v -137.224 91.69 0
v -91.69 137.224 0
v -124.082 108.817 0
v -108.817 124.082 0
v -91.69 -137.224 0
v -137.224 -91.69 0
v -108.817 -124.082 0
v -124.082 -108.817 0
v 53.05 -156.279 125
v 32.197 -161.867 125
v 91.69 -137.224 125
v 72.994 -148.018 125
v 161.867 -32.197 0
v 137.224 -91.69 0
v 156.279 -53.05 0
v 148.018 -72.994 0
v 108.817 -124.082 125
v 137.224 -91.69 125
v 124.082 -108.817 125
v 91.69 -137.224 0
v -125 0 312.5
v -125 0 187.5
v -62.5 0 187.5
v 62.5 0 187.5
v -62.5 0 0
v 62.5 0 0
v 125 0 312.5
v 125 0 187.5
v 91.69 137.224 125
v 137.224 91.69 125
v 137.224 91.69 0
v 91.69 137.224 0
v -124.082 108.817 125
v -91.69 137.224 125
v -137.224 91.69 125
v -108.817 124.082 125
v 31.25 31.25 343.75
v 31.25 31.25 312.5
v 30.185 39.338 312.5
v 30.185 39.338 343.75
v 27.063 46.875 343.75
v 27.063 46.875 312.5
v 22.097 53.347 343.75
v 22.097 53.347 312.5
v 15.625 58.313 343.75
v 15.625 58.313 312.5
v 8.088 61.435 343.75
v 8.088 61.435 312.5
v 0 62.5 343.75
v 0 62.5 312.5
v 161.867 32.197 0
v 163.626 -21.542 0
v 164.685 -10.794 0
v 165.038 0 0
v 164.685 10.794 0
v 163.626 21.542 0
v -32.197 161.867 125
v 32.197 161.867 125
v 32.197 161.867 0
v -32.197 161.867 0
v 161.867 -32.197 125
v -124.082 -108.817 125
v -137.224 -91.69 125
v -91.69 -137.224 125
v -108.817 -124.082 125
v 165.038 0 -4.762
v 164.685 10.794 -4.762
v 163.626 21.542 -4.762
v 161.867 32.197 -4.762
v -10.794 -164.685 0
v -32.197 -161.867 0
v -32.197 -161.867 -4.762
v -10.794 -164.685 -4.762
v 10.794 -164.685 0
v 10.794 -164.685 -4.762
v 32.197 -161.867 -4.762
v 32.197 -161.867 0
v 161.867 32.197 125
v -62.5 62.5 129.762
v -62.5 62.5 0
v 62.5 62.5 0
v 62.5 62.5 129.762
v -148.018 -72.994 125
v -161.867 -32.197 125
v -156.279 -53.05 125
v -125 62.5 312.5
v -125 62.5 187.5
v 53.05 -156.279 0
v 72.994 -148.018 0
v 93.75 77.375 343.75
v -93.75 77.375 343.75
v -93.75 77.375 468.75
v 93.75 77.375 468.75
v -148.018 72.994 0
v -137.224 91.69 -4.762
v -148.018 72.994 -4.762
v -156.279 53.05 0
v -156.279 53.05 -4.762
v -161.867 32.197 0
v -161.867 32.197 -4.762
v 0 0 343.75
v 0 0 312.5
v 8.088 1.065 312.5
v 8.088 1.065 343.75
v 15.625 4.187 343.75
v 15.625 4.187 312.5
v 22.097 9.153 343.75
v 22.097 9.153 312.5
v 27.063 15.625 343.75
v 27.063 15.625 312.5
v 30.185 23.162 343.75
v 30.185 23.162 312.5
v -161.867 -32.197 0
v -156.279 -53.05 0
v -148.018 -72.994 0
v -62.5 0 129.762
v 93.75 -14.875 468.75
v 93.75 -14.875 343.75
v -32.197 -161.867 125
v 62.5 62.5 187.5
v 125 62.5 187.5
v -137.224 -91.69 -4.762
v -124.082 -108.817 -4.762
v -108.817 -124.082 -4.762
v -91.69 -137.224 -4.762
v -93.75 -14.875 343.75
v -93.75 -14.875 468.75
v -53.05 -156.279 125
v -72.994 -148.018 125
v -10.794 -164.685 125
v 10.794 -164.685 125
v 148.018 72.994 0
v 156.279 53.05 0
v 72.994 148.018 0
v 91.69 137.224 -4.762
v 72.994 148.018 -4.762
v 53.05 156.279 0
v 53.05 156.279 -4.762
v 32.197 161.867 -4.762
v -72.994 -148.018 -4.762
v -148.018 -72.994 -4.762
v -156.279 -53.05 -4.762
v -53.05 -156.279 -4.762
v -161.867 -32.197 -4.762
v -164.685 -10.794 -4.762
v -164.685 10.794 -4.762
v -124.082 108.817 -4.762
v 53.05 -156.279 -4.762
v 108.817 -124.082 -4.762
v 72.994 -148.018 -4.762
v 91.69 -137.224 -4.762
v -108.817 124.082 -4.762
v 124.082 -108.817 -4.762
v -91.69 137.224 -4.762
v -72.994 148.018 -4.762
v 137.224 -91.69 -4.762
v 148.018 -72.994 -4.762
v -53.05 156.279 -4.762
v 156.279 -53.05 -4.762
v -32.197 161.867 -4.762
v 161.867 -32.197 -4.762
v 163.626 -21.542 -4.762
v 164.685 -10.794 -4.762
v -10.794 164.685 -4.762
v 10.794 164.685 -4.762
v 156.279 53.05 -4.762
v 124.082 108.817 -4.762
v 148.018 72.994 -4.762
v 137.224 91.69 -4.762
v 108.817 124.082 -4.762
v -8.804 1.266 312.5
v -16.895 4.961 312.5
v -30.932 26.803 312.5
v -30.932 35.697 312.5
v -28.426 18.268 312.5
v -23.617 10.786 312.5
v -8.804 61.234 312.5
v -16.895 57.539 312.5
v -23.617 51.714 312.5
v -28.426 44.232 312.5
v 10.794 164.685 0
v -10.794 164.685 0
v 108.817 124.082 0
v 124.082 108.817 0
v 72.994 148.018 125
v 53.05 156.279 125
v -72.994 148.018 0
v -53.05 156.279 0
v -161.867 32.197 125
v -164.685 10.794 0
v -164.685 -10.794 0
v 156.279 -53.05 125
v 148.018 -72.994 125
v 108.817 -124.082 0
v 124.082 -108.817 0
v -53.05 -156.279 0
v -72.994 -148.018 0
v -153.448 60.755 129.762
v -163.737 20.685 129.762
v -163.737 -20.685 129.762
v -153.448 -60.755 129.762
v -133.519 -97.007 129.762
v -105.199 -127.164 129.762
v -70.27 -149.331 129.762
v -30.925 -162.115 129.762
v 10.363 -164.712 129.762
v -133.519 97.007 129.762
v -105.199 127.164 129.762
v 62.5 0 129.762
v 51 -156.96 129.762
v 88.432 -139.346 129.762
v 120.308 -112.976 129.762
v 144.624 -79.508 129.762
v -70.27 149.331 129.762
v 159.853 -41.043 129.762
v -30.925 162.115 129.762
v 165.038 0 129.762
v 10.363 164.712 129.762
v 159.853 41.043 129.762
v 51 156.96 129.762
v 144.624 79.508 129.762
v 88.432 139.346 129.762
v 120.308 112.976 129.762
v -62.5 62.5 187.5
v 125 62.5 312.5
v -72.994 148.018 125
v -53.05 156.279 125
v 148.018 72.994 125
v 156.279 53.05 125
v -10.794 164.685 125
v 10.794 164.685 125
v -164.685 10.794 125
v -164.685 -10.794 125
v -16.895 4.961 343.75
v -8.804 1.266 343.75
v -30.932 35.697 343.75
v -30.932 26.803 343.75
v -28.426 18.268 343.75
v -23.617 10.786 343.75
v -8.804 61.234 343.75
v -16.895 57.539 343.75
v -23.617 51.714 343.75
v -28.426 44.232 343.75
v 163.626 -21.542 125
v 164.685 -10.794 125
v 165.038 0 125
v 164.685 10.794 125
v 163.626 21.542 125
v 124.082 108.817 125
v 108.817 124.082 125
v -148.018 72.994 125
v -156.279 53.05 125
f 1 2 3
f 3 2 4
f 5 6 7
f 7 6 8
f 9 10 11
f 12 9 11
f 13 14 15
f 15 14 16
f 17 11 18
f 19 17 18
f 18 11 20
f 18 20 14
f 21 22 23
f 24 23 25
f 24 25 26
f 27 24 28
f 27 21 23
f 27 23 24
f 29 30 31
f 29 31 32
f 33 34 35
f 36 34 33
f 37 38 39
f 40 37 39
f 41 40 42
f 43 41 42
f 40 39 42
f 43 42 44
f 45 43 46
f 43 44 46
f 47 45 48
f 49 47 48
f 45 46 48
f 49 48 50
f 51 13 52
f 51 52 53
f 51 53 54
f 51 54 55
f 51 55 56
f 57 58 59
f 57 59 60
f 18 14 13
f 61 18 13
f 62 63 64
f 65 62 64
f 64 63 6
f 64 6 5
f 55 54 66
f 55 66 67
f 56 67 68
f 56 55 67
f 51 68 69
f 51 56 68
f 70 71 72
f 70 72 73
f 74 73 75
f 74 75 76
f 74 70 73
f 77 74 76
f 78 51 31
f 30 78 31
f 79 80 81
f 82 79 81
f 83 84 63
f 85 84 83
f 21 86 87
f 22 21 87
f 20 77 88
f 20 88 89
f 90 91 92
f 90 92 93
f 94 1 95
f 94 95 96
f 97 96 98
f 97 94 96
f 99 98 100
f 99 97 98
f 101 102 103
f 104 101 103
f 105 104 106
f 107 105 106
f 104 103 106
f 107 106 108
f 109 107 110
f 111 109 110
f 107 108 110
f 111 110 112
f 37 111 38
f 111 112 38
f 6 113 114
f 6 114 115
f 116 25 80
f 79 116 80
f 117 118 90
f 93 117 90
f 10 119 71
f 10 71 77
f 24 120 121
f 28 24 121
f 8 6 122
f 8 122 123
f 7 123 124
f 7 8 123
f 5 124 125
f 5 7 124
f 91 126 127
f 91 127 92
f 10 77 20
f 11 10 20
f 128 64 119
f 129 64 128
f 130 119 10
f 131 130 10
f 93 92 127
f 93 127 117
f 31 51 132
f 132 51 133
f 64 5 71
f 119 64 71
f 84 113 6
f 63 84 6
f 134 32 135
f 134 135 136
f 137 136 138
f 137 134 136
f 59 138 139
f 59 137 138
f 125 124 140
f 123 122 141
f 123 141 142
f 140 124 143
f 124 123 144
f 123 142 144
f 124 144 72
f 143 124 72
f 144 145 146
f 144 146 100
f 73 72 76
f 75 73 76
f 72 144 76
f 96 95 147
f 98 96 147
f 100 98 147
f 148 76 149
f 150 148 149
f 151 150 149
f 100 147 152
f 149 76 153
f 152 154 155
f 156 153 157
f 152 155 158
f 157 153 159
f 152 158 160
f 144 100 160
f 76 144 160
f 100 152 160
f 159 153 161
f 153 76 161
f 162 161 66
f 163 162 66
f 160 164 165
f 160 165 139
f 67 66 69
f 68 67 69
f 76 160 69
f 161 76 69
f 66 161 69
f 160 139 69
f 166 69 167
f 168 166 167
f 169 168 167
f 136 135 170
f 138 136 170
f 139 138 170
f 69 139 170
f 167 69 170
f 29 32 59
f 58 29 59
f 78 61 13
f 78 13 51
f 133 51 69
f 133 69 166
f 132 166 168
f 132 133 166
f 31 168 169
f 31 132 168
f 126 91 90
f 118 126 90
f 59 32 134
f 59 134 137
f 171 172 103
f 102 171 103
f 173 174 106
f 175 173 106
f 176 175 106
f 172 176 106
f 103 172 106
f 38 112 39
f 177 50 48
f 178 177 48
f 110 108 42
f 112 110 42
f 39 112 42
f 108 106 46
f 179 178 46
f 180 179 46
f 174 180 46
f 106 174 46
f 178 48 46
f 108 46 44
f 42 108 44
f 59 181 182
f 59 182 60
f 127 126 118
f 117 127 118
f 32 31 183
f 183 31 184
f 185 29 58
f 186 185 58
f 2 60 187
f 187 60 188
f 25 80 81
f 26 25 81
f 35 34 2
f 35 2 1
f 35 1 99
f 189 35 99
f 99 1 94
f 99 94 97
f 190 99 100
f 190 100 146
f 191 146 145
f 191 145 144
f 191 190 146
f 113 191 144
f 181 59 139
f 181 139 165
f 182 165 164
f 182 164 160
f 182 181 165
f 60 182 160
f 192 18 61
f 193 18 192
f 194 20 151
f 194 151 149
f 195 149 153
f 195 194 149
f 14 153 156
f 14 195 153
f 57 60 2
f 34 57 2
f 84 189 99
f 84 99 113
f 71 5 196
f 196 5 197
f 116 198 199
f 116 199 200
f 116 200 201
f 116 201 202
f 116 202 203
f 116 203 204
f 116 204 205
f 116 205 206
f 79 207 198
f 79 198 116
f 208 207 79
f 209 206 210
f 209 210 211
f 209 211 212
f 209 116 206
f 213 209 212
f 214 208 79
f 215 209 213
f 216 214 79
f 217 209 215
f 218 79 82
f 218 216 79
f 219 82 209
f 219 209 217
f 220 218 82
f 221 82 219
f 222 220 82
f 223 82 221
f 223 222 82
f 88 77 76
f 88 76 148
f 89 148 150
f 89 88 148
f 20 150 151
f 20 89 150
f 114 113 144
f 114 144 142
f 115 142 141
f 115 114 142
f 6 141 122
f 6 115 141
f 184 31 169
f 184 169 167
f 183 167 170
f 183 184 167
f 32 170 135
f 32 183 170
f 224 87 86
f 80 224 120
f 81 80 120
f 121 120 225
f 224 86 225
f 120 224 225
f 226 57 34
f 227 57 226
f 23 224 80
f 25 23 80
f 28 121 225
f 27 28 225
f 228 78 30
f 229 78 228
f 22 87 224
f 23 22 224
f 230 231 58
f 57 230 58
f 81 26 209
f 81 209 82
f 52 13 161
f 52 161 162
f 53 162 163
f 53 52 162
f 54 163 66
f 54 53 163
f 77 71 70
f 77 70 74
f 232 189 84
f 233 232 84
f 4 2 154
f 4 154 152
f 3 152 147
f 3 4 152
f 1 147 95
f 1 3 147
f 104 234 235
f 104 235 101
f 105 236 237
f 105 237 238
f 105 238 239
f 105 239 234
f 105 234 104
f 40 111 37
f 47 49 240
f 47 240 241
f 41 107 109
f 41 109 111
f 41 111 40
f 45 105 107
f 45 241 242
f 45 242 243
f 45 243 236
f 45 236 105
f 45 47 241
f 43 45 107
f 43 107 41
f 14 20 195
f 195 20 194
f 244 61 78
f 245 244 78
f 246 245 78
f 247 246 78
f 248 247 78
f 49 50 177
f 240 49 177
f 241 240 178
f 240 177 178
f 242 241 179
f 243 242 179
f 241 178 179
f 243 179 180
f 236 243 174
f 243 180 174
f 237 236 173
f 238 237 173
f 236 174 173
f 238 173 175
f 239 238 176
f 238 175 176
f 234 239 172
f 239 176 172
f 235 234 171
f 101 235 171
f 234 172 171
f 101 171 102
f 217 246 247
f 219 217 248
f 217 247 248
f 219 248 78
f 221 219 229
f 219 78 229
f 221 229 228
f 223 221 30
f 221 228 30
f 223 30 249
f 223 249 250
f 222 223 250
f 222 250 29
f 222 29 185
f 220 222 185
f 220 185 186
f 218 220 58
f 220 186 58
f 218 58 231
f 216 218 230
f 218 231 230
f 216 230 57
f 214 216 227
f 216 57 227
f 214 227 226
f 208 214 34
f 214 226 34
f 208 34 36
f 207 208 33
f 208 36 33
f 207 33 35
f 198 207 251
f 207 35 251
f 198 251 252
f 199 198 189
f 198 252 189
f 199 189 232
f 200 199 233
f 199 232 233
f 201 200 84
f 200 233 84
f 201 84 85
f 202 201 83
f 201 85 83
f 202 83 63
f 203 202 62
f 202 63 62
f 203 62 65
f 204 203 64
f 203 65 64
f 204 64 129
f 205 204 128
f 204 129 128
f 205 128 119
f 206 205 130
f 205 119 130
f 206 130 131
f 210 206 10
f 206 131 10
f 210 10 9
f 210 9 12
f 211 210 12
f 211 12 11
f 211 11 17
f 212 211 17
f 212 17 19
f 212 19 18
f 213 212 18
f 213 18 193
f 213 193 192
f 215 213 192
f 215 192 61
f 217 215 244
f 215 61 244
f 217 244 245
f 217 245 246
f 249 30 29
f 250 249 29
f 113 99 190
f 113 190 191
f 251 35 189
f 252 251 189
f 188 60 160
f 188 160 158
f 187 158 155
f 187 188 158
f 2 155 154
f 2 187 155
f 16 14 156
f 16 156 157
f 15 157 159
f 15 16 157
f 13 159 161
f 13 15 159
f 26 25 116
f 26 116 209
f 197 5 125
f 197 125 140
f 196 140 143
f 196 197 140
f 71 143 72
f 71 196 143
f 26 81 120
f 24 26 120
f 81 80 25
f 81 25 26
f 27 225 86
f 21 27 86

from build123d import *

# Parameters (mm, degrees)
F3_W      = 125
F3_H      = 62.5
F4_DEPTH  = 4.7625
F5_DEPTH  = 125
F6_R      = 165.0380183748
F7_DEPTH  = 4.7625
F8_DEPTH  = 386
F11_DEPTH = 62.5
F13_DEPTH = 31.25
F14_W     = 187.5
F14_H     = 92.25
F15_DEPTH = 125


# Not quite as in the source:
# - a length typed as a fraction of an inch, garbled in the dataset ("3 / 203.2 mm" for 3/8 in), is restored
# - a feature names something its author has since deleted; it is built from what else it names


with BuildPart() as f4:
    # F3 (on Top) → F4 (new body)
    with BuildSketch(Plane.XY):
        with BuildLine():
            ThreePointArc((161.8668591289, -32.1973201496), (164.2433152069, -16.1765546068), (165.0380183748, 0))
            ThreePointArc((165.0380183748, 0), (164.2433152069, 16.1765546068), (161.8668591289, 32.1973201496))
            Line((161.8668591289, 32.1973201496), (161.8668591289, -32.1973201496))
        make_face()
        with BuildLine():
            Line((137.2240971533, 91.6902103256), (161.8668591289, 32.1973201496))
            ThreePointArc((161.8668591289, 32.1973201496), (152.4752472627, 63.1573153424), (137.2240971533, 91.6902103256))
        make_face()
        Polygon((161.8668591289, -32.1973201496), (161.8668591289, 32.1973201496), (137.2240971533, 91.6902103256), (91.6902103256, 137.2240971533), (32.1973201496, 161.8668591289), (-32.1973201496, 161.8668591289), (-91.6902103256, 137.2240971533), (-137.2240971533, 91.6902103256), (-161.8668591289, 32.1973201496), (-161.8668591289, -32.1973201496), (-137.2240971533, -91.6902103256), (-91.6902103256, -137.2240971533), (-32.1973201496, -161.8668591289), (32.1973201496, -161.8668591289), (91.6902103256, -137.2240971533), (137.2240971533, -91.6902103256), align=None)
        with Locations((0, 31.25)):
            Rectangle(F3_W, F3_H, mode=Mode.SUBTRACT)
        with BuildLine():
            ThreePointArc((137.2240971533, -91.6902103256), (152.4752472627, -63.1573153424), (161.8668591289, -32.1973201496))
            Line((161.8668591289, -32.1973201496), (137.2240971533, -91.6902103256))
        make_face()
        with BuildLine():
            Line((91.6902103256, 137.2240971533), (137.2240971533, 91.6902103256))
            ThreePointArc((137.2240971533, 91.6902103256), (116.6995019464, 116.6995019464), (91.6902103256, 137.2240971533))
        make_face()
        with BuildLine():
            ThreePointArc((91.6902103256, -137.2240971533), (116.6995019464, -116.6995019464), (137.2240971533, -91.6902103256))
            Line((137.2240971533, -91.6902103256), (91.6902103256, -137.2240971533))
        make_face()
        with BuildLine():
            Line((32.1973201496, 161.8668591289), (91.6902103256, 137.2240971533))
            ThreePointArc((91.6902103256, 137.2240971533), (63.1573153424, 152.4752472627), (32.1973201496, 161.8668591289))
        make_face()
        with BuildLine():
            ThreePointArc((32.1973201496, -161.8668591289), (63.1573153424, -152.4752472627), (91.6902103256, -137.2240971533))
            Line((91.6902103256, -137.2240971533), (32.1973201496, -161.8668591289))
        make_face()
        with BuildLine():
            Line((-32.1973201496, 161.8668591289), (32.1973201496, 161.8668591289))
            ThreePointArc((32.1973201496, 161.8668591289), (0, 165.0380183748), (-32.1973201496, 161.8668591289))
        make_face()
        with BuildLine():
            ThreePointArc((-32.1973201496, -161.8668591289), (0, -165.0380183748), (32.1973201496, -161.8668591289))
            Line((32.1973201496, -161.8668591289), (-32.1973201496, -161.8668591289))
        make_face()
        with BuildLine():
            Line((-91.6902103256, 137.2240971533), (-32.1973201496, 161.8668591289))
            ThreePointArc((-32.1973201496, 161.8668591289), (-63.1573153424, 152.4752472627), (-91.6902103256, 137.2240971533))
        make_face()
        with BuildLine():
            ThreePointArc((-91.6902103256, -137.2240971533), (-63.1573153424, -152.4752472627), (-32.1973201496, -161.8668591289))
            Line((-32.1973201496, -161.8668591289), (-91.6902103256, -137.2240971533))
        make_face()
        with BuildLine():
            Line((-137.2240971533, 91.6902103256), (-91.6902103256, 137.2240971533))
            ThreePointArc((-91.6902103256, 137.2240971533), (-116.6995019464, 116.6995019464), (-137.2240971533, 91.6902103256))
        make_face()
        with BuildLine():
            ThreePointArc((-137.2240971533, -91.6902103256), (-116.6995019464, -116.6995019464), (-91.6902103256, -137.2240971533))
            Line((-91.6902103256, -137.2240971533), (-137.2240971533, -91.6902103256))
        make_face()
        with BuildLine():
            Line((-161.8668591289, 32.1973201496), (-137.2240971533, 91.6902103256))
            ThreePointArc((-137.2240971533, 91.6902103256), (-152.4752472627, 63.1573153424), (-161.8668591289, 32.1973201496))
        make_face()
        with BuildLine():
            ThreePointArc((-161.8668591289, -32.1973201496), (-152.4752472627, -63.1573153424), (-137.2240971533, -91.6902103256))
            Line((-137.2240971533, -91.6902103256), (-161.8668591289, -32.1973201496))
        make_face()
        with BuildLine():
            Line((-161.8668591289, -32.1973201496), (-161.8668591289, 32.1973201496))
            ThreePointArc((-161.8668591289, 32.1973201496), (-165.0380183748, 0), (-161.8668591289, -32.1973201496))
        make_face()
        with Locations((0, 31.25)):
            Rectangle(F3_W, F3_H)
    extrude(amount=-F4_DEPTH)

    # F3 (on Top) → F5 (join)
    with BuildSketch(Plane.XY):
        Polygon((161.8668591289, -32.1973201496), (161.8668591289, 32.1973201496), (137.2240971533, 91.6902103256), (91.6902103256, 137.2240971533), (32.1973201496, 161.8668591289), (-32.1973201496, 161.8668591289), (-91.6902103256, 137.2240971533), (-137.2240971533, 91.6902103256), (-161.8668591289, 32.1973201496), (-161.8668591289, -32.1973201496), (-137.2240971533, -91.6902103256), (-91.6902103256, -137.2240971533), (-32.1973201496, -161.8668591289), (32.1973201496, -161.8668591289), (91.6902103256, -137.2240971533), (137.2240971533, -91.6902103256), align=None)
        with Locations((0, 31.25)):
            Rectangle(F3_W, F3_H, mode=Mode.SUBTRACT)
        with Locations((0, 31.25)):
            Rectangle(F3_W, F3_H)
    extrude(amount=F5_DEPTH)

    # F6 (on face) → F7 (join)
    with BuildSketch(Plane.XY.offset(125)):
        Circle(F6_R)
    extrude(amount=F7_DEPTH)


with BuildPart() as f8:
    # F3 (on Top) → F8 (new body)
    with BuildSketch(Plane.XY):
        with Locations((0, 31.25)):
            Rectangle(F3_W, F3_H)
    extrude(amount=F8_DEPTH)


with BuildPart() as f4_1:
    add(f4.part)

    # F9: cut F8
    add(f8.part, mode=Mode.SUBTRACT)


with BuildPart() as f11:
    # F10 (on face) → F11 (new body)
    with BuildSketch(Plane.XZ.offset(-62.5)):
        Polygon((-62.5, 187.5), (-62.5, 0), (62.5, 0), (62.5, 187.5), (125, 187.5), (125, 312.5), (-125, 312.5), (-125, 187.5), align=None)
    extrude(amount=F11_DEPTH)


with BuildPart() as f13:
    # F12 (on face) → F13 (new body)
    with BuildSketch(Plane.XY.offset(312.5)):
        with BuildLine():
            ThreePointArc((9.8e-09, 0), (22.0970869155, 9.1529130914), (31.25, 31.25))
            ThreePointArc((31.25, 31.25), (22.0970869306, 53.3470868935), (5.24e-08, 62.5))
            ThreePointArc((5.24e-08, 62.5), (-31.25, 31.2500000213), (9.8e-09, 0))
        make_face()
    extrude(amount=F13_DEPTH)


with BuildPart() as f15:
    # F14 (on face) → F15 (new body)
    with BuildSketch(Plane.XY.offset(343.75)):
        with Locations((0, 31.25)):
            Rectangle(F14_W, F14_H)
    extrude(amount=F15_DEPTH)


solid = Compound([f4_1.part, f11.part, f13.part, f15.part])
